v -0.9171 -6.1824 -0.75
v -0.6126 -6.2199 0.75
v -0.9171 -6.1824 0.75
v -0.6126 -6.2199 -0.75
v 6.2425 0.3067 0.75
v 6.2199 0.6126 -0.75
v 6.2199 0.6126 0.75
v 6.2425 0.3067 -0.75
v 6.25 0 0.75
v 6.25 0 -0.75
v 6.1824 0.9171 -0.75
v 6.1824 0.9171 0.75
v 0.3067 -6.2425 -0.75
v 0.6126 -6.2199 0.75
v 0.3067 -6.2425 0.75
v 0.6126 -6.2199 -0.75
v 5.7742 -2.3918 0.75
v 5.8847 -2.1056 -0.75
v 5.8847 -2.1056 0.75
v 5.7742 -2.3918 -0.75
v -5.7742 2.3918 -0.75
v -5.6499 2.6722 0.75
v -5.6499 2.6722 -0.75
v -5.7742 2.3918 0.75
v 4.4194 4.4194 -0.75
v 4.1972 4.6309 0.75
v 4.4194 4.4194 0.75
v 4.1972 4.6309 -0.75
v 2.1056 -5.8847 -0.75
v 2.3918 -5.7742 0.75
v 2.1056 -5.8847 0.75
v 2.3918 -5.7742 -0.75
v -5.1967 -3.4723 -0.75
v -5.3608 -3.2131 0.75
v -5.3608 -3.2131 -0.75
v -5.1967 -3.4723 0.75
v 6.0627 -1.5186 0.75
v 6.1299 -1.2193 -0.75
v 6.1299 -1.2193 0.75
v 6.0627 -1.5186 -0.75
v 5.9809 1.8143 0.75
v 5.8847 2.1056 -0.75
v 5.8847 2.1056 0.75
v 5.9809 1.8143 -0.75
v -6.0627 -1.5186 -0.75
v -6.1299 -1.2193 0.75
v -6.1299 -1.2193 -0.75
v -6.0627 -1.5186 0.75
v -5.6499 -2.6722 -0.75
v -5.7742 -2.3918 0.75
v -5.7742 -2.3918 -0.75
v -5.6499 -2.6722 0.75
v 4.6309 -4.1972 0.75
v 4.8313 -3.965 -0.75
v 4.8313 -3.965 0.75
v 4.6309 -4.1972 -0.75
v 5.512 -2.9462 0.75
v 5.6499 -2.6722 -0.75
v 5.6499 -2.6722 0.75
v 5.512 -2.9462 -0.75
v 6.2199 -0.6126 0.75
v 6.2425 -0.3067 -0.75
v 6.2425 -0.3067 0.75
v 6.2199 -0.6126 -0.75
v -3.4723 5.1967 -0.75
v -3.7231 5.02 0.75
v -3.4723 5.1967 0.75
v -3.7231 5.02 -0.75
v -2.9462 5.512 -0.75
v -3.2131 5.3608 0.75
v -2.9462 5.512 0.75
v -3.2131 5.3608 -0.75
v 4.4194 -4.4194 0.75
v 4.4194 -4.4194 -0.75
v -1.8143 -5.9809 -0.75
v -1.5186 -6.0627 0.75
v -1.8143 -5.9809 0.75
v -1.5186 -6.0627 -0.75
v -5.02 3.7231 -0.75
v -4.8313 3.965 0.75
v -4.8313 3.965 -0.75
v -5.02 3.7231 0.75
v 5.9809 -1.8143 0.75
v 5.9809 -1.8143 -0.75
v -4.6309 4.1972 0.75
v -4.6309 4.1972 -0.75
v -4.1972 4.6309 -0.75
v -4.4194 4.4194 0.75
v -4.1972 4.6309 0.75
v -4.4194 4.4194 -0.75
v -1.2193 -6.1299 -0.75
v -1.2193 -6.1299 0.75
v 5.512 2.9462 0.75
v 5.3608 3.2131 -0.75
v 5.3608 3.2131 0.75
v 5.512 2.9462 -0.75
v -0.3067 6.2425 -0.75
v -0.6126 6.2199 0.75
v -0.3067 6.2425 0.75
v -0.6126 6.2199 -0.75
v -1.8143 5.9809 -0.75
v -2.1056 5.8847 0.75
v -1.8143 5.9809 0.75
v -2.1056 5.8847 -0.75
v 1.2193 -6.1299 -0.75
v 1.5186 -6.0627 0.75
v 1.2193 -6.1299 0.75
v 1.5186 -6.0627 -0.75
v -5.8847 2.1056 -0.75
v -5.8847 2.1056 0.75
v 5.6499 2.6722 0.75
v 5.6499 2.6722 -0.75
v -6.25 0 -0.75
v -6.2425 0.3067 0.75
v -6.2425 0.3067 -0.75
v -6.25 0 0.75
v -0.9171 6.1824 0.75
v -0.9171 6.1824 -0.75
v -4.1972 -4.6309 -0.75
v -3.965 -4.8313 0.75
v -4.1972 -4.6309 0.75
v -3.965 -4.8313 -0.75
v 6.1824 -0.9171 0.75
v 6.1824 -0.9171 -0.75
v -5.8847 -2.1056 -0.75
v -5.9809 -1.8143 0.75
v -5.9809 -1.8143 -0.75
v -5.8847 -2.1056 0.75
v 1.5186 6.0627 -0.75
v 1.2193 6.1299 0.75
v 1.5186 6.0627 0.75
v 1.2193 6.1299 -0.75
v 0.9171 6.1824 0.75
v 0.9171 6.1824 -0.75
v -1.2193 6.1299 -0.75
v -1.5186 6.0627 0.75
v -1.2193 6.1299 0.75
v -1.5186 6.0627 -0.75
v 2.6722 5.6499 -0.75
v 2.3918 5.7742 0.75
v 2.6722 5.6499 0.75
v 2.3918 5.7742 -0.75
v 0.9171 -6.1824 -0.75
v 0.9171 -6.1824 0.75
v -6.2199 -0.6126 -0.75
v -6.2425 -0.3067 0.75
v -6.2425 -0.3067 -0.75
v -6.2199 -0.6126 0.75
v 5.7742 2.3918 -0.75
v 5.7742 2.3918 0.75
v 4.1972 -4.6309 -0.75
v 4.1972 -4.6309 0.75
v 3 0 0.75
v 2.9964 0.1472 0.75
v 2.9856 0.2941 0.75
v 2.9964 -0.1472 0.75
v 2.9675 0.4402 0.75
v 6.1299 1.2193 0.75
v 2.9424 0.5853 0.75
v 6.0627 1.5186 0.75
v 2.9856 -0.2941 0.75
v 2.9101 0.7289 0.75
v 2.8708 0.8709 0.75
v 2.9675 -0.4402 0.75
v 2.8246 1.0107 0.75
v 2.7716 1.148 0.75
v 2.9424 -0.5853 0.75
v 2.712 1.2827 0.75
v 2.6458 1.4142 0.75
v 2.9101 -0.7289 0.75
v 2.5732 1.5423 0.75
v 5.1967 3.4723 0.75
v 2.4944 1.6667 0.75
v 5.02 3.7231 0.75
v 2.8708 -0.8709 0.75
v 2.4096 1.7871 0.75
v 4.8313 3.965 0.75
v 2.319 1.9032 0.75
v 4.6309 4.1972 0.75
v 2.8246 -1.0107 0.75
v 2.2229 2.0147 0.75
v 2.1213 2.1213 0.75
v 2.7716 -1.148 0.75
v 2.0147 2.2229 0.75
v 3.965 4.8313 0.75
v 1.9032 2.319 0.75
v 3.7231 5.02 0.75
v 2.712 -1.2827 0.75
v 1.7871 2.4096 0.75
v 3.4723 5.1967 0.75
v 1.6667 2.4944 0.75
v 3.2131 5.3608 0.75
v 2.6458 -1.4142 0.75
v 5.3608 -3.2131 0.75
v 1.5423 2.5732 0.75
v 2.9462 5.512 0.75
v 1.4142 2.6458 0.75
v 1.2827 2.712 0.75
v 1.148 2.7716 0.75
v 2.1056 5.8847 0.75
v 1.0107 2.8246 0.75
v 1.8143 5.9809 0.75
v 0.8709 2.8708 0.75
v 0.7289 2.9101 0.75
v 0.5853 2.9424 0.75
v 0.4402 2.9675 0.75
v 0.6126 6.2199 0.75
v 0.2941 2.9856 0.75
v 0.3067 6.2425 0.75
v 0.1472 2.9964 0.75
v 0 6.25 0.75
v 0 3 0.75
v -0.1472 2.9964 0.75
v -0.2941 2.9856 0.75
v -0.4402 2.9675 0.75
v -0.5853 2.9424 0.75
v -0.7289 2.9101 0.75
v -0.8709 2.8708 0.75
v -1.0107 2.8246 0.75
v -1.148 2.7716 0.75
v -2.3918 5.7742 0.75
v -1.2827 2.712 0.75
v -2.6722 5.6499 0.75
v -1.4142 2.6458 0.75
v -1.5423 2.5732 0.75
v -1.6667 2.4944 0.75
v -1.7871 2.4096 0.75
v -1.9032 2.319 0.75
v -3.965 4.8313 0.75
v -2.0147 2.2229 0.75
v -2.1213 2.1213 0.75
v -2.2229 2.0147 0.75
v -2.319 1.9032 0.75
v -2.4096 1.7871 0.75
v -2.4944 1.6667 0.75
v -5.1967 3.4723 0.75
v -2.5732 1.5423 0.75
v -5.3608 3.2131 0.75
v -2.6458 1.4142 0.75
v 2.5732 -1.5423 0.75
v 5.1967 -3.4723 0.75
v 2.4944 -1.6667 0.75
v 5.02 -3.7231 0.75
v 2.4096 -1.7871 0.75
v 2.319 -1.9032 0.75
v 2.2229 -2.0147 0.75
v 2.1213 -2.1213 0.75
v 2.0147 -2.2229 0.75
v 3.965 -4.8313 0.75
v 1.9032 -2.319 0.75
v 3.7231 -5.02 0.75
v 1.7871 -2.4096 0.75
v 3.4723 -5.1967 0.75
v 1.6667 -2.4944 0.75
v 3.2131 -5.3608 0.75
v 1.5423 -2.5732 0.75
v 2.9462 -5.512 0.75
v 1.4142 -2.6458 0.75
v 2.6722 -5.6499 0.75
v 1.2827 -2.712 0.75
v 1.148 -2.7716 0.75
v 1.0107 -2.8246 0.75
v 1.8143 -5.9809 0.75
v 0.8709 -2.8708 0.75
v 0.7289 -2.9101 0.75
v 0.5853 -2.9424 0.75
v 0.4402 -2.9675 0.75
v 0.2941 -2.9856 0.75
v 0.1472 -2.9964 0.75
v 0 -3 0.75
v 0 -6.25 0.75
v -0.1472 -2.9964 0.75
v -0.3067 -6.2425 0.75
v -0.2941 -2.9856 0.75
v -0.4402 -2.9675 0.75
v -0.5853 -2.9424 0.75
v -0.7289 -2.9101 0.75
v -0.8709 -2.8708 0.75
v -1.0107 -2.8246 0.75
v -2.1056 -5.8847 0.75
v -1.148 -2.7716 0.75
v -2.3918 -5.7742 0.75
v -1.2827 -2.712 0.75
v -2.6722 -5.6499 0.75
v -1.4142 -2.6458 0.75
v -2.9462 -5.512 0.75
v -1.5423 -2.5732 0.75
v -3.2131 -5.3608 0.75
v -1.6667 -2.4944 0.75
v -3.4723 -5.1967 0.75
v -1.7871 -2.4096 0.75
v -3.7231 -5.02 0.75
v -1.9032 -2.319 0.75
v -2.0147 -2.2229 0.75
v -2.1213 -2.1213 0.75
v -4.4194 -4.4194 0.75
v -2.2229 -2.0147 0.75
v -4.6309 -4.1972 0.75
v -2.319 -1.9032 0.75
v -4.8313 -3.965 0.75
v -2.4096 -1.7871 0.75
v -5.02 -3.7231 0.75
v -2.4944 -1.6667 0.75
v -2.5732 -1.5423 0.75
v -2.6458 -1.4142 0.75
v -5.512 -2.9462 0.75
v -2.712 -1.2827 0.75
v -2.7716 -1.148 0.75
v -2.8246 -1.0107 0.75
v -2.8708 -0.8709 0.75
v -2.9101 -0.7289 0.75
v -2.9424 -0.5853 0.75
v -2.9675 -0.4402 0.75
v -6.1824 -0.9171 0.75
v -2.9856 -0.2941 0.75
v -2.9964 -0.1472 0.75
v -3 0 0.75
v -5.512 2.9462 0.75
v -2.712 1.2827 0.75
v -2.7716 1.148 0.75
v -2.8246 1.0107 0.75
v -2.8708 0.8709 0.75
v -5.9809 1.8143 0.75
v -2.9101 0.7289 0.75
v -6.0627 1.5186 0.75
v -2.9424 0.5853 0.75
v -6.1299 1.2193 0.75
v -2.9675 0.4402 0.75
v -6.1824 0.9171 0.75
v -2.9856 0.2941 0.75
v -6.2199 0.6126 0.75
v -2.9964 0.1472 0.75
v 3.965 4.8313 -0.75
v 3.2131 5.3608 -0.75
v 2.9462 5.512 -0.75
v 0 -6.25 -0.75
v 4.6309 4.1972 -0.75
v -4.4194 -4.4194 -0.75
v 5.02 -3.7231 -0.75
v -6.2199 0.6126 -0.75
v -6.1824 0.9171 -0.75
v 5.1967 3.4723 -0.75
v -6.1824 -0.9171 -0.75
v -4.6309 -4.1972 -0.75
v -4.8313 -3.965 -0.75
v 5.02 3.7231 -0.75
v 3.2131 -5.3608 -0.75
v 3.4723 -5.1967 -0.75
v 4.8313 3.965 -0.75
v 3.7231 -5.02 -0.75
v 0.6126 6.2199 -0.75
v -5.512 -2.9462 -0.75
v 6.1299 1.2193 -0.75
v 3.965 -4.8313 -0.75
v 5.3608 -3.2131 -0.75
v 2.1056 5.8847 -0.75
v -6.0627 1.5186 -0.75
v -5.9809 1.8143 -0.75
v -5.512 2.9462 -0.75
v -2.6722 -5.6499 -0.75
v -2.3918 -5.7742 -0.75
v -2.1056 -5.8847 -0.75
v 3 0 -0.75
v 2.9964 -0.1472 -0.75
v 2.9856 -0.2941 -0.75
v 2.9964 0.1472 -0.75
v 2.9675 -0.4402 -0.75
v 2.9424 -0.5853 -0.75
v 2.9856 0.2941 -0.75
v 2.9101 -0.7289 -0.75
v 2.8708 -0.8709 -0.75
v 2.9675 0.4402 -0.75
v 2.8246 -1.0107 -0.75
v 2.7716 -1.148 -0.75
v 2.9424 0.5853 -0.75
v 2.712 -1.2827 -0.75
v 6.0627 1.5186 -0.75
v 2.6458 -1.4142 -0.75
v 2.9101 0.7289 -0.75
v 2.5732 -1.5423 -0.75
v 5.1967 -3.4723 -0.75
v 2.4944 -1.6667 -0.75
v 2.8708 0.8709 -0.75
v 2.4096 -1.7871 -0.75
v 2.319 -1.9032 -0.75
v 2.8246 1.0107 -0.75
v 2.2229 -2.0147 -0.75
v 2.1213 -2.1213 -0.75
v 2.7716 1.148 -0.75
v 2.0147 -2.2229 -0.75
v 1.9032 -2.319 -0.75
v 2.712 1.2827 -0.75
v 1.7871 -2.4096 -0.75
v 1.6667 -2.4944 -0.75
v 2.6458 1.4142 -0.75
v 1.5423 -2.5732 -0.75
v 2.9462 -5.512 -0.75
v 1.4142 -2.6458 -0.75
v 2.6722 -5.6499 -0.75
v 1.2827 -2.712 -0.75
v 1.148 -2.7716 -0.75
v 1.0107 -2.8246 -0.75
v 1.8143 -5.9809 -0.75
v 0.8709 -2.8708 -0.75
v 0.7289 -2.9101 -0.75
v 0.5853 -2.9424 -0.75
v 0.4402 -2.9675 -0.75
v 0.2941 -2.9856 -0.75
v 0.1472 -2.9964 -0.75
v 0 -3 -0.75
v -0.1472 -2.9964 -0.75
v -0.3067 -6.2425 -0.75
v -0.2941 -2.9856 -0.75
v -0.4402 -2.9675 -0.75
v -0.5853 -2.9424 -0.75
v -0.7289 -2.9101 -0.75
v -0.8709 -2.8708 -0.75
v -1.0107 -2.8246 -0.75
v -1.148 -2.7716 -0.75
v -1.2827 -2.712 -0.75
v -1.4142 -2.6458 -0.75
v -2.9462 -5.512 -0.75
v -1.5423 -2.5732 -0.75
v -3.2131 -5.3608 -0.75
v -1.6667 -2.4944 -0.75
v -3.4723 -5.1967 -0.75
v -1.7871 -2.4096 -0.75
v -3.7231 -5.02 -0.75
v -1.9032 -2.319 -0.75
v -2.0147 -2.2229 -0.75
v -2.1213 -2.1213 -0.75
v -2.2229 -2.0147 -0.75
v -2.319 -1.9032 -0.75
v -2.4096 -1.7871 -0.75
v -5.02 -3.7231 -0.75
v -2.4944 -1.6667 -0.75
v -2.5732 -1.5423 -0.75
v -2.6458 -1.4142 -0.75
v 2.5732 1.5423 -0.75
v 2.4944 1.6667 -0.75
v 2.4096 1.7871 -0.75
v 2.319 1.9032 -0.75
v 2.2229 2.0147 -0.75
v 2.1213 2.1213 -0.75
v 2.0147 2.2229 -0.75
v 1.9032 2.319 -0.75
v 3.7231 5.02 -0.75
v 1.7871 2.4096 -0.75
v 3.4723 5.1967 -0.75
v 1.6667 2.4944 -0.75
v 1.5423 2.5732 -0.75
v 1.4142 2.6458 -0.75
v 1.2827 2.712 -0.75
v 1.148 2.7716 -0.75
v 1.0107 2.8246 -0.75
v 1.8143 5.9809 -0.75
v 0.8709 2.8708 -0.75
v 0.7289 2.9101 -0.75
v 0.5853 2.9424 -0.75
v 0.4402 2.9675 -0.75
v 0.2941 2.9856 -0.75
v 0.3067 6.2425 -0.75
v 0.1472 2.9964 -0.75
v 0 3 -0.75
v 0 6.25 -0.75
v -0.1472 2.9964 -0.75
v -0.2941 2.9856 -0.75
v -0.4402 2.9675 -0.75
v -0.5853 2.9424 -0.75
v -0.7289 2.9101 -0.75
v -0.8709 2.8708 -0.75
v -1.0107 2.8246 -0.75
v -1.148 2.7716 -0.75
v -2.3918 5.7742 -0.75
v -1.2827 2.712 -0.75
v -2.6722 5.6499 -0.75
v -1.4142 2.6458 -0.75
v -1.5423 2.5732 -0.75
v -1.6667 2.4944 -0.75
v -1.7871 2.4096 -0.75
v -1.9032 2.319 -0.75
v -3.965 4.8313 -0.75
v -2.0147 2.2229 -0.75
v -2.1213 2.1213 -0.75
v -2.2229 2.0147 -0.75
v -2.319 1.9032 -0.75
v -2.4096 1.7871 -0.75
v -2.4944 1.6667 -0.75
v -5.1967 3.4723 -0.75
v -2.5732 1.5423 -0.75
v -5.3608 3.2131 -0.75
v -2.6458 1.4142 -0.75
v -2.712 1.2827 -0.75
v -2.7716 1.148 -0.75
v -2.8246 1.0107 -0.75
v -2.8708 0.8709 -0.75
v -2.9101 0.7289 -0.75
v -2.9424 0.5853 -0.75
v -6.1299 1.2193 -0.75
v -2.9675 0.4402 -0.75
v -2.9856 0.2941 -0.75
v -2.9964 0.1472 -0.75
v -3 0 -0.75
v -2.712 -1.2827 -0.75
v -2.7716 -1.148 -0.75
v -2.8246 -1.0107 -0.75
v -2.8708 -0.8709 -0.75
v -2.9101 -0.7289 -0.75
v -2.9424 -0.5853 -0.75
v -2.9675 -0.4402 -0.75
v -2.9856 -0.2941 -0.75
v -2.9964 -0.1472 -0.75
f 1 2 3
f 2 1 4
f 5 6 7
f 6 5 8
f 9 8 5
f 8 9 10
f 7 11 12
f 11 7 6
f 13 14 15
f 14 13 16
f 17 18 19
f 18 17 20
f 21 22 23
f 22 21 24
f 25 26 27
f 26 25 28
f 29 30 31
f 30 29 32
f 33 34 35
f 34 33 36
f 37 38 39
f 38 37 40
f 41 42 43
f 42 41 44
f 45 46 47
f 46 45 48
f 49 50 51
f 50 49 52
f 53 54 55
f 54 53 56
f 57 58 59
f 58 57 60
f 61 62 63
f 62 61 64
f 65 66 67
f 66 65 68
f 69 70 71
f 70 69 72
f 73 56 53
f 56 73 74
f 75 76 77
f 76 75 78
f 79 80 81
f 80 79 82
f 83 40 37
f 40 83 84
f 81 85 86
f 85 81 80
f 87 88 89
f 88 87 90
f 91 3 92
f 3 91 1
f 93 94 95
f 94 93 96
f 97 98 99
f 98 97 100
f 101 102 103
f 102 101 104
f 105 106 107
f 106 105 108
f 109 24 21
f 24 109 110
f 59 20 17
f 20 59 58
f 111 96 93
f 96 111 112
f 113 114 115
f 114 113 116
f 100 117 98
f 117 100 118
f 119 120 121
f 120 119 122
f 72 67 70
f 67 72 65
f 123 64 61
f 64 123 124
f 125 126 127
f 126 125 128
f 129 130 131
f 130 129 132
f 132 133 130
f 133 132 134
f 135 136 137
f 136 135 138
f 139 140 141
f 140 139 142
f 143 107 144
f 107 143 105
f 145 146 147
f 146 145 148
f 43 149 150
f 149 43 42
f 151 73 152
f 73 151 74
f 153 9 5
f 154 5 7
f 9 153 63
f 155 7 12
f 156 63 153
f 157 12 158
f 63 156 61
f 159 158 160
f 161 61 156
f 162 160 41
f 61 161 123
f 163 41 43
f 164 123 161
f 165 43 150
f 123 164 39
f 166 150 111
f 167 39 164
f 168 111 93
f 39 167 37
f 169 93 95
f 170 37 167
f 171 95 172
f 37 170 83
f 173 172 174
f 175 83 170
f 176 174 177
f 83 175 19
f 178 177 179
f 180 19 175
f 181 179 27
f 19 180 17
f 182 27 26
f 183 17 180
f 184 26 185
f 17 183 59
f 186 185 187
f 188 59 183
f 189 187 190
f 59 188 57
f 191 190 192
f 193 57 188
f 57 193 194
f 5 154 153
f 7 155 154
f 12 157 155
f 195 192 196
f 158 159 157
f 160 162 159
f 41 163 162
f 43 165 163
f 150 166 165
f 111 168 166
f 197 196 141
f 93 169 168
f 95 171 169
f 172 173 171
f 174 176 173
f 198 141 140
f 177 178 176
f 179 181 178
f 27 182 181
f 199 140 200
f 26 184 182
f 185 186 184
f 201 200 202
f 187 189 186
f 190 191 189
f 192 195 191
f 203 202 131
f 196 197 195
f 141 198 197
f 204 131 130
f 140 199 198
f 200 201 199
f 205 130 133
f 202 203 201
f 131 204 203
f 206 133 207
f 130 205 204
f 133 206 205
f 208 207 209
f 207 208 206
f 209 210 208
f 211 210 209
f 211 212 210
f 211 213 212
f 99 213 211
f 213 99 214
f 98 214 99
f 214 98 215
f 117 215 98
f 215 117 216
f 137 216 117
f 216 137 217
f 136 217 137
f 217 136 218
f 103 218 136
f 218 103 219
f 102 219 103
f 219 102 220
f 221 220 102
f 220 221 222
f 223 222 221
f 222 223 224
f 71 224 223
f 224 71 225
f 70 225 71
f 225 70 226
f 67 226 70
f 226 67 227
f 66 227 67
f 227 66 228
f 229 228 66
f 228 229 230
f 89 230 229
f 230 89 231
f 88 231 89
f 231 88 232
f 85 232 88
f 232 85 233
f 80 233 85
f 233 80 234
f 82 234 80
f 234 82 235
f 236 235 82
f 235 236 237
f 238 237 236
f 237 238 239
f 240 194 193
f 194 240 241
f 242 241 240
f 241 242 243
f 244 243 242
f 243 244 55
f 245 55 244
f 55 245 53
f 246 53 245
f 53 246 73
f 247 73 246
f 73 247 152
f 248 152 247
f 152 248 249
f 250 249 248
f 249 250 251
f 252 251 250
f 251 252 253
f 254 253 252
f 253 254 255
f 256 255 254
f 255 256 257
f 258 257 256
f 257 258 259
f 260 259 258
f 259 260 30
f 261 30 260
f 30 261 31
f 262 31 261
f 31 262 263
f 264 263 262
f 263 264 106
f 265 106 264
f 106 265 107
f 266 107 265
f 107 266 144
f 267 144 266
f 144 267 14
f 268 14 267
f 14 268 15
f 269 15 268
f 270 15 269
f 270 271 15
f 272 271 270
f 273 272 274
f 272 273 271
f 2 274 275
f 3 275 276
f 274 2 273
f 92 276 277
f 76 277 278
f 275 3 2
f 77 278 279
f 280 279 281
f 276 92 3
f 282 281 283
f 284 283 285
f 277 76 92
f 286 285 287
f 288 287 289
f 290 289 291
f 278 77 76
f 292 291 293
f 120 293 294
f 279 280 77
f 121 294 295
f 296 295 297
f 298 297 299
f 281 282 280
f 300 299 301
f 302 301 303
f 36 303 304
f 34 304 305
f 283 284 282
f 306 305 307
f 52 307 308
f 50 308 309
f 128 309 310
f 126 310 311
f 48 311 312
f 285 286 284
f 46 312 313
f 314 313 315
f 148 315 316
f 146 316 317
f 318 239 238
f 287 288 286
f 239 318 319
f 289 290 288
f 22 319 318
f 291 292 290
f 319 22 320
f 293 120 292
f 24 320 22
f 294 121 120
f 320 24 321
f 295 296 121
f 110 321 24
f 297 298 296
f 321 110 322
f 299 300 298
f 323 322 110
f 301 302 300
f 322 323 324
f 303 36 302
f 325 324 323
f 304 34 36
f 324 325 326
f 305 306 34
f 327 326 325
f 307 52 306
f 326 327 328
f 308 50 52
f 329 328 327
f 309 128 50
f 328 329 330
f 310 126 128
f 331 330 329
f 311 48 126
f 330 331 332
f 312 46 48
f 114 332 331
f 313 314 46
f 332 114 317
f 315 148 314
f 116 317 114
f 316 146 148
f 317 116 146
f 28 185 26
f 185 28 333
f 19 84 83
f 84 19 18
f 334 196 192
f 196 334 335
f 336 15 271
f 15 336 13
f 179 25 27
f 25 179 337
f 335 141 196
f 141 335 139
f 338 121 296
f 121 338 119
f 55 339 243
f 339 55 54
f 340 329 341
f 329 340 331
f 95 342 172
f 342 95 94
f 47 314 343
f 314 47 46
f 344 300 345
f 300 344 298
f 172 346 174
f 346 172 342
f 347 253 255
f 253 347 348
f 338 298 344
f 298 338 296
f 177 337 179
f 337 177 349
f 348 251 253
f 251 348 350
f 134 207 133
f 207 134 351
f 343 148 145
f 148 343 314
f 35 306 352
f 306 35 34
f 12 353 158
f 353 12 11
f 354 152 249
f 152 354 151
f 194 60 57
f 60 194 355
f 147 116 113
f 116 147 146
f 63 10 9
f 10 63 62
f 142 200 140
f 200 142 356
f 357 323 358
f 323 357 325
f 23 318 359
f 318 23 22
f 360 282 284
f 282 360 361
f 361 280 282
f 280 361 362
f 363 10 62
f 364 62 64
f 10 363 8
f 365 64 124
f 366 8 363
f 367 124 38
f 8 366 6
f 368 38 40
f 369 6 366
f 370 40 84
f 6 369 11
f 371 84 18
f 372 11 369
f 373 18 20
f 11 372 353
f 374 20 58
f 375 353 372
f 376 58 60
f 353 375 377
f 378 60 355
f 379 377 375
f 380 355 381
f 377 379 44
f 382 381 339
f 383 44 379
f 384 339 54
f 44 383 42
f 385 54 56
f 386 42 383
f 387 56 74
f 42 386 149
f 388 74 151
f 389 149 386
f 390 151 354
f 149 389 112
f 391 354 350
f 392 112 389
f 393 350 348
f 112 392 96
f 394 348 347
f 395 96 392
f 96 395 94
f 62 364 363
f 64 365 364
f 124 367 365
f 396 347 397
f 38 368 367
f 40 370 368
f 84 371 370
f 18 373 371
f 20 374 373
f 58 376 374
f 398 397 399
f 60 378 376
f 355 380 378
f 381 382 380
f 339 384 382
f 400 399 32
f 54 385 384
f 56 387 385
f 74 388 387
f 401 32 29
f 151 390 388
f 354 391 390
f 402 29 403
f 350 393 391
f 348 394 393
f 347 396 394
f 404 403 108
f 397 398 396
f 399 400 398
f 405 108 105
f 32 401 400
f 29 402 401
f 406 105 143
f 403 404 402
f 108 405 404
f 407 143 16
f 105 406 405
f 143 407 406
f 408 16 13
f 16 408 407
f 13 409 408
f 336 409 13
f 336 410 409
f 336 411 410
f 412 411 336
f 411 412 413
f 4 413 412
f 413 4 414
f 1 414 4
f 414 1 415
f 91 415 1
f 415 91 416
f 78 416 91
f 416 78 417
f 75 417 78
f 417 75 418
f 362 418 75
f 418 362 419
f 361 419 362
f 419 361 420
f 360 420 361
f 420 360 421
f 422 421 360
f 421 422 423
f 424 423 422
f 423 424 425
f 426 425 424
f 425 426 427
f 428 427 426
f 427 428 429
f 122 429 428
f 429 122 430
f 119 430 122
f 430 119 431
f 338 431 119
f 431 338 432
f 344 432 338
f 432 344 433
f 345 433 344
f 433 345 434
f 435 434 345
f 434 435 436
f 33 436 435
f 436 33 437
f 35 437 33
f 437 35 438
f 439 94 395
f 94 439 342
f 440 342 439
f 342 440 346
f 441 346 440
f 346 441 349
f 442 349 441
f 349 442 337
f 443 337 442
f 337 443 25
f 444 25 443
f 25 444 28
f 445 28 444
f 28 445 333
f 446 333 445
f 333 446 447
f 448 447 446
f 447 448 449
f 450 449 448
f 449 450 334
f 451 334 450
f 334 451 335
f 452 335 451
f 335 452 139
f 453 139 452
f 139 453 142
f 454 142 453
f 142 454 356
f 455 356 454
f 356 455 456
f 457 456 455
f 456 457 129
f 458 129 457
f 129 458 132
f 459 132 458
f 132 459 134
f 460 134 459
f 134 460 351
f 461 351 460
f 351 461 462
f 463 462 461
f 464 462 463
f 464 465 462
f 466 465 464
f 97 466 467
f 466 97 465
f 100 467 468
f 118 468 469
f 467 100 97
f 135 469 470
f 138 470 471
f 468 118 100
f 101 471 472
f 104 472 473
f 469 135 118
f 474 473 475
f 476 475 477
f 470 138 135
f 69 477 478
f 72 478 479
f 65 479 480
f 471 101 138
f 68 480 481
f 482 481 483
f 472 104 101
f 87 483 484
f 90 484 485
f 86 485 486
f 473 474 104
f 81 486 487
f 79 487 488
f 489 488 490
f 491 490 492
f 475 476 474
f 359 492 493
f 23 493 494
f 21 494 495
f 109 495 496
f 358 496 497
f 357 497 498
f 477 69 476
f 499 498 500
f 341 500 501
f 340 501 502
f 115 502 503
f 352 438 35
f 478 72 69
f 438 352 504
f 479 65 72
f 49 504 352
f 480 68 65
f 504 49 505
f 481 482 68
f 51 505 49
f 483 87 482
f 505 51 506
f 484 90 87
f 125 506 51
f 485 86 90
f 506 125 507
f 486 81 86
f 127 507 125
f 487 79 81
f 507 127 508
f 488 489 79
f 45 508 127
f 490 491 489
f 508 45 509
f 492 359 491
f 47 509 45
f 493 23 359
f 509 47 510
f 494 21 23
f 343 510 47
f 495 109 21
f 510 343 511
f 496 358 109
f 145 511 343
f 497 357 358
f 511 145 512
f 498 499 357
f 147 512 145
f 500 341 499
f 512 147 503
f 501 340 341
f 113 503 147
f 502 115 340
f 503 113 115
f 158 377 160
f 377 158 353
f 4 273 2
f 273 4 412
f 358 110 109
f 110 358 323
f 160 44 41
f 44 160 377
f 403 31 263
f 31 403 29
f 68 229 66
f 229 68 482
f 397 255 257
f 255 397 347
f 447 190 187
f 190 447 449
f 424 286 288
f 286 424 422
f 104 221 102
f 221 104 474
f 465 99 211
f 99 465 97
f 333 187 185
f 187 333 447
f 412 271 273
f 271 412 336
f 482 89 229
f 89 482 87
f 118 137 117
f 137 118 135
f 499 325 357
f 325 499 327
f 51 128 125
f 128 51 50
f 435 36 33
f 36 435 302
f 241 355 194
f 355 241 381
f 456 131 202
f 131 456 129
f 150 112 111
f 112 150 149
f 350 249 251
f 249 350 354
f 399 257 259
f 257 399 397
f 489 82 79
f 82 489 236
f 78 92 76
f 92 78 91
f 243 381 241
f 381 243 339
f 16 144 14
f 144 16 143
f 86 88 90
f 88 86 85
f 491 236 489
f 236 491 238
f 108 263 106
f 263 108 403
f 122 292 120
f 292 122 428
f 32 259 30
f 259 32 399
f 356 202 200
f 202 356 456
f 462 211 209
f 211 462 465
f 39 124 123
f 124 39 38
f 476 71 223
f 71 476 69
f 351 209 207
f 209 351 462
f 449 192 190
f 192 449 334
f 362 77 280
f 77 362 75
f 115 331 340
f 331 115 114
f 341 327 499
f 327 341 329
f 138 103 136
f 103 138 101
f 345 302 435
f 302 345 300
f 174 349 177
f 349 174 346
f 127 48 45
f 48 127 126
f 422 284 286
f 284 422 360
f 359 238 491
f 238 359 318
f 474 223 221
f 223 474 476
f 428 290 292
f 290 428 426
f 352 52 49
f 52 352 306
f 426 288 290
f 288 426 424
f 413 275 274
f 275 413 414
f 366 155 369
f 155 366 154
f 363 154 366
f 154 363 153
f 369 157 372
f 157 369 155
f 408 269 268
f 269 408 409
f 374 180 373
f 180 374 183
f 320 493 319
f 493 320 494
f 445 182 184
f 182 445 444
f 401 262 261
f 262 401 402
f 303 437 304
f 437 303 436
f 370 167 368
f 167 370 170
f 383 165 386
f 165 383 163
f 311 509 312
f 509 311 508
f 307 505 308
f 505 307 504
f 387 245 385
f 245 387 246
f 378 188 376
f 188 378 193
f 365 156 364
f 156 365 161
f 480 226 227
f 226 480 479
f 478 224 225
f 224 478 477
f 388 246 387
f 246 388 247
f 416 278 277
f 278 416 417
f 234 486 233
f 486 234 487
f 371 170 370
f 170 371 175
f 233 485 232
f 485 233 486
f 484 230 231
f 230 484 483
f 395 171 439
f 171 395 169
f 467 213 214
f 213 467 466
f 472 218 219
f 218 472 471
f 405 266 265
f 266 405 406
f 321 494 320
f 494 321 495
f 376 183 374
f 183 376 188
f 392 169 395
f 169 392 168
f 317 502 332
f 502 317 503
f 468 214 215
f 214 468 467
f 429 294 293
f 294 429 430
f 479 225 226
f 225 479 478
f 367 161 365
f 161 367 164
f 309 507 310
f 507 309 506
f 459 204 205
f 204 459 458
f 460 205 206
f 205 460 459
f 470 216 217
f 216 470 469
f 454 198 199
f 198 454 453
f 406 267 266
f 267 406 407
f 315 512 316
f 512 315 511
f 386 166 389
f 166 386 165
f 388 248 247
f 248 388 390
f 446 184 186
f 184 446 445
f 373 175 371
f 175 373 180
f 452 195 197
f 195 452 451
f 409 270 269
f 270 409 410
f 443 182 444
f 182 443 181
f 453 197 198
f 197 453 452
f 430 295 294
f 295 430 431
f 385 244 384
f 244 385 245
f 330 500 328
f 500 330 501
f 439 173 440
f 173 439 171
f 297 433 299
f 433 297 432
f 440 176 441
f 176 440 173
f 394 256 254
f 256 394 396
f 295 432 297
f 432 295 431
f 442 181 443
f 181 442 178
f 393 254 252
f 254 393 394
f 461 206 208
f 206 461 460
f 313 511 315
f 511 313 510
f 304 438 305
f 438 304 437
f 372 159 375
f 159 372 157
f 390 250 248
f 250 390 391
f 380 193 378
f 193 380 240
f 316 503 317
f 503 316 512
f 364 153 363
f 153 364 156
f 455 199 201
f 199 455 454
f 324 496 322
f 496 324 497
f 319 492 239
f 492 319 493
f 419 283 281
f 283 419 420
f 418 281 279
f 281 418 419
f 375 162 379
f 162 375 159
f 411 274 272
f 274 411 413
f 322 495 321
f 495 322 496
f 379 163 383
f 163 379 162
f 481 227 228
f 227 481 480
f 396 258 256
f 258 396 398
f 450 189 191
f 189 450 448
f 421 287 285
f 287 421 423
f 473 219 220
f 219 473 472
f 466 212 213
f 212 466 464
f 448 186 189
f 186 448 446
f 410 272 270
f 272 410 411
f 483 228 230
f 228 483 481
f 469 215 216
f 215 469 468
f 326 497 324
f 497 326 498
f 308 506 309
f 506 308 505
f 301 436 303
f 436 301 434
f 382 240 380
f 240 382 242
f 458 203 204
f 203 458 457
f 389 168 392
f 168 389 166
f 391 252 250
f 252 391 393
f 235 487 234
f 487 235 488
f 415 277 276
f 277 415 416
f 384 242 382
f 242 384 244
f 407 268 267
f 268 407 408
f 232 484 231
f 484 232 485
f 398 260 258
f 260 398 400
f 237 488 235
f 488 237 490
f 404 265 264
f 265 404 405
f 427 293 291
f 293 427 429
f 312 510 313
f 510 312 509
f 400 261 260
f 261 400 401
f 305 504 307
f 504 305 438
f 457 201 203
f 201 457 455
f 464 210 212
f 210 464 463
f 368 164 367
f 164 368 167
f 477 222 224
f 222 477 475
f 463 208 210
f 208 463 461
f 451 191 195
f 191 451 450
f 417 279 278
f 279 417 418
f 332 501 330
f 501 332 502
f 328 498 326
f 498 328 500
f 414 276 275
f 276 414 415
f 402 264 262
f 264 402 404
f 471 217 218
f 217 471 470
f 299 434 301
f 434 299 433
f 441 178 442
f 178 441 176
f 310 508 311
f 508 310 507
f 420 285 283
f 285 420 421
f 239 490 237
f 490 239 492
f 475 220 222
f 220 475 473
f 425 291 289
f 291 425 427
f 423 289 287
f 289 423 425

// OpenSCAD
// Flat Washer Parameters (mm)
inner_diameter_mm = 6.0;
outer_diameter_mm = 12.5;
thickness_mm      = 1.5;

// Smoothness (increase for smoother circles)
$fn = 128;

module flat_washer(id, od, t) {
    difference() {
        cylinder(d=od, h=t, center=true);
        // Slightly taller cut to guarantee a clean through-hole
        cylinder(d=id, h=t + 0.2, center=true);
    }
}

flat_washer(inner_diameter_mm, outer_diameter_mm, thickness_mm);
